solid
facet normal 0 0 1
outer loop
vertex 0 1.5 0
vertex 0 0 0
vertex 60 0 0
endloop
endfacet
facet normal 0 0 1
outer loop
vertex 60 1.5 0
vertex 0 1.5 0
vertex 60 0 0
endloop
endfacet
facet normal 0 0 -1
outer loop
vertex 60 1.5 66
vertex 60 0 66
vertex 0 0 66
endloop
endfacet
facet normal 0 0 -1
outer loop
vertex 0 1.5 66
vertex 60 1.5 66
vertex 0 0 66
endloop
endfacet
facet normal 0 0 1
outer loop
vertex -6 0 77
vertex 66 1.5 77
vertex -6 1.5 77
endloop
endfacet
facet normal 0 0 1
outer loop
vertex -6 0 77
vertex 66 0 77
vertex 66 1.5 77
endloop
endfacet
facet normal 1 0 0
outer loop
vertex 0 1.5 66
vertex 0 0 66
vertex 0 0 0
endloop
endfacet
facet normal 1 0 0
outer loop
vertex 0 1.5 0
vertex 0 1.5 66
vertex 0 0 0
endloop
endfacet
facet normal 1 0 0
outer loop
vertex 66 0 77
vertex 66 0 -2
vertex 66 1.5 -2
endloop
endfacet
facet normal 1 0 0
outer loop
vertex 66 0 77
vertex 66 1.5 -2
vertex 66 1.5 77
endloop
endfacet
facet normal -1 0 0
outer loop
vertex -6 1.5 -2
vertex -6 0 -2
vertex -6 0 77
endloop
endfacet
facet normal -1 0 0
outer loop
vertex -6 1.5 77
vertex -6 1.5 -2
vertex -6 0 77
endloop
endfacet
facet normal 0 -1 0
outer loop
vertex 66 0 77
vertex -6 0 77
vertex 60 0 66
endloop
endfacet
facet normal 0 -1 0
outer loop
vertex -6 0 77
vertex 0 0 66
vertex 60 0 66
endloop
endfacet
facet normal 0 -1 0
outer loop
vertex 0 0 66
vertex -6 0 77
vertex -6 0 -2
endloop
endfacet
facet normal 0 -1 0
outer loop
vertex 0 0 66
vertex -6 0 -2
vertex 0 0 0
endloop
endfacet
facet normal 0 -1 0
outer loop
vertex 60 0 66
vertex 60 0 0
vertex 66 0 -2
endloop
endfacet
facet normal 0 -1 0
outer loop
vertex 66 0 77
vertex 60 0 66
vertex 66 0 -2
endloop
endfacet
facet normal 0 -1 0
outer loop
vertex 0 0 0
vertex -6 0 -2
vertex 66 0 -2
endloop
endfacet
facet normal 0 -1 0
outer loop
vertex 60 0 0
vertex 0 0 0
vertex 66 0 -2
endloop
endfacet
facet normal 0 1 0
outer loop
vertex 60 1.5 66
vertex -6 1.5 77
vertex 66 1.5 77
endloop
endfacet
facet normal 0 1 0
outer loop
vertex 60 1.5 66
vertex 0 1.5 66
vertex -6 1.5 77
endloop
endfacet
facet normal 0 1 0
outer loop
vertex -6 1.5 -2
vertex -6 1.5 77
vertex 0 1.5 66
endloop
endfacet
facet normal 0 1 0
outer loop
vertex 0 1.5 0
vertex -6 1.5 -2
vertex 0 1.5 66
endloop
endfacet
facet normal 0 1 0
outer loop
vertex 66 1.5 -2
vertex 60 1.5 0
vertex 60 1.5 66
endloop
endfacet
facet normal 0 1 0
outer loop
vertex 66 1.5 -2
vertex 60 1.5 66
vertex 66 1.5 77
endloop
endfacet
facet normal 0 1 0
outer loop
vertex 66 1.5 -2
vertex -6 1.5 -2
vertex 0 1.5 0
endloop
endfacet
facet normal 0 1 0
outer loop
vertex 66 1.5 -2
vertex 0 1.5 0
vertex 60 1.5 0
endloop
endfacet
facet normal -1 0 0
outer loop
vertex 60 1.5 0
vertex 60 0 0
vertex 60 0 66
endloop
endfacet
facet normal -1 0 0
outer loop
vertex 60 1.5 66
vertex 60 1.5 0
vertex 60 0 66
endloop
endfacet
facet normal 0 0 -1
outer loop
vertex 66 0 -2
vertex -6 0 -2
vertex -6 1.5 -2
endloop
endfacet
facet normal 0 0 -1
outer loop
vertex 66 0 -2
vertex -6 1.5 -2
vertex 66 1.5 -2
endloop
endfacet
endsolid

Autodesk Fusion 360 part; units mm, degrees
sketch "Sketch1" plane through (0, 0, 0) normal (0, 1, 0) x (1, 0, 0) in component "Component"
  line L0 (0, 0) -> (60, 0)
  line L1 (60, 0) -> (60, -66)
  line L2 (60, -66) -> (0, -66)
  line L3 (0, -66) -> (0, 0)
  line L4 (0, 0) -> (-2, 0)
  line L5 (0, 0) -> (0, 2)
  line L6 (-2, 2) -> (62, 2)
  line L7 (62, 2) -> (62, -76)
  line L8 (62, -76) -> (-2, -76)
  line L9 (-2, -76) -> (-2, 2)
  line L10 (62, 2) -> (-6, 2)
  line L11 (-6, 2) -> (-6, -76)
  line L12 (-6, -76) -> (62, -76)
  line L13 (62, -76) -> (62, 2)
  line L14 (62, 2) -> (66, 2)
  line L15 (66, 2) -> (66, -76)
  line L16 (66, -76) -> (62, -76)
  line L17 (62, -76) -> (62, 2)
  line L18 (-6, -76) -> (66, -76)
  line L19 (66, -76) -> (66, -77)
  line L20 (66, -77) -> (-6, -77)
  line L21 (-6, -77) -> (-6, -76)
  dimension "d1" = 60
  dimension "d2" = 66
  dimension "d3" = 2
  dimension "d4" = 2
  dimension "d5" = 78
  dimension "d6" = 64
  dimension "d7" = 68
  dimension "d8" = 4
  dimension "d11" = 1
extrude "Extrude1" add sketch "Sketch1" along normal blind 1.5 contours L4 L5 L6 L7 L8 L9 L10 L12 L13 L17 L18 | L4 L5 L6 L9 L10 | L9 L10 L11 L12 L18 | L7 L13 L14 L15 L16 L17 L18 in component "Component"
extrude "Extrude2" add sketch "Sketch1" along normal blind 1.5 contours L8 L12 L16 L18 L19 L20 L21 in component "Component"
component "Component" placed x (1, 0, 0) y (0, 1, 0) z (0, 0, 1) at (0, 0, 0)
equation "d5 = 66 mm + 12 mm"
